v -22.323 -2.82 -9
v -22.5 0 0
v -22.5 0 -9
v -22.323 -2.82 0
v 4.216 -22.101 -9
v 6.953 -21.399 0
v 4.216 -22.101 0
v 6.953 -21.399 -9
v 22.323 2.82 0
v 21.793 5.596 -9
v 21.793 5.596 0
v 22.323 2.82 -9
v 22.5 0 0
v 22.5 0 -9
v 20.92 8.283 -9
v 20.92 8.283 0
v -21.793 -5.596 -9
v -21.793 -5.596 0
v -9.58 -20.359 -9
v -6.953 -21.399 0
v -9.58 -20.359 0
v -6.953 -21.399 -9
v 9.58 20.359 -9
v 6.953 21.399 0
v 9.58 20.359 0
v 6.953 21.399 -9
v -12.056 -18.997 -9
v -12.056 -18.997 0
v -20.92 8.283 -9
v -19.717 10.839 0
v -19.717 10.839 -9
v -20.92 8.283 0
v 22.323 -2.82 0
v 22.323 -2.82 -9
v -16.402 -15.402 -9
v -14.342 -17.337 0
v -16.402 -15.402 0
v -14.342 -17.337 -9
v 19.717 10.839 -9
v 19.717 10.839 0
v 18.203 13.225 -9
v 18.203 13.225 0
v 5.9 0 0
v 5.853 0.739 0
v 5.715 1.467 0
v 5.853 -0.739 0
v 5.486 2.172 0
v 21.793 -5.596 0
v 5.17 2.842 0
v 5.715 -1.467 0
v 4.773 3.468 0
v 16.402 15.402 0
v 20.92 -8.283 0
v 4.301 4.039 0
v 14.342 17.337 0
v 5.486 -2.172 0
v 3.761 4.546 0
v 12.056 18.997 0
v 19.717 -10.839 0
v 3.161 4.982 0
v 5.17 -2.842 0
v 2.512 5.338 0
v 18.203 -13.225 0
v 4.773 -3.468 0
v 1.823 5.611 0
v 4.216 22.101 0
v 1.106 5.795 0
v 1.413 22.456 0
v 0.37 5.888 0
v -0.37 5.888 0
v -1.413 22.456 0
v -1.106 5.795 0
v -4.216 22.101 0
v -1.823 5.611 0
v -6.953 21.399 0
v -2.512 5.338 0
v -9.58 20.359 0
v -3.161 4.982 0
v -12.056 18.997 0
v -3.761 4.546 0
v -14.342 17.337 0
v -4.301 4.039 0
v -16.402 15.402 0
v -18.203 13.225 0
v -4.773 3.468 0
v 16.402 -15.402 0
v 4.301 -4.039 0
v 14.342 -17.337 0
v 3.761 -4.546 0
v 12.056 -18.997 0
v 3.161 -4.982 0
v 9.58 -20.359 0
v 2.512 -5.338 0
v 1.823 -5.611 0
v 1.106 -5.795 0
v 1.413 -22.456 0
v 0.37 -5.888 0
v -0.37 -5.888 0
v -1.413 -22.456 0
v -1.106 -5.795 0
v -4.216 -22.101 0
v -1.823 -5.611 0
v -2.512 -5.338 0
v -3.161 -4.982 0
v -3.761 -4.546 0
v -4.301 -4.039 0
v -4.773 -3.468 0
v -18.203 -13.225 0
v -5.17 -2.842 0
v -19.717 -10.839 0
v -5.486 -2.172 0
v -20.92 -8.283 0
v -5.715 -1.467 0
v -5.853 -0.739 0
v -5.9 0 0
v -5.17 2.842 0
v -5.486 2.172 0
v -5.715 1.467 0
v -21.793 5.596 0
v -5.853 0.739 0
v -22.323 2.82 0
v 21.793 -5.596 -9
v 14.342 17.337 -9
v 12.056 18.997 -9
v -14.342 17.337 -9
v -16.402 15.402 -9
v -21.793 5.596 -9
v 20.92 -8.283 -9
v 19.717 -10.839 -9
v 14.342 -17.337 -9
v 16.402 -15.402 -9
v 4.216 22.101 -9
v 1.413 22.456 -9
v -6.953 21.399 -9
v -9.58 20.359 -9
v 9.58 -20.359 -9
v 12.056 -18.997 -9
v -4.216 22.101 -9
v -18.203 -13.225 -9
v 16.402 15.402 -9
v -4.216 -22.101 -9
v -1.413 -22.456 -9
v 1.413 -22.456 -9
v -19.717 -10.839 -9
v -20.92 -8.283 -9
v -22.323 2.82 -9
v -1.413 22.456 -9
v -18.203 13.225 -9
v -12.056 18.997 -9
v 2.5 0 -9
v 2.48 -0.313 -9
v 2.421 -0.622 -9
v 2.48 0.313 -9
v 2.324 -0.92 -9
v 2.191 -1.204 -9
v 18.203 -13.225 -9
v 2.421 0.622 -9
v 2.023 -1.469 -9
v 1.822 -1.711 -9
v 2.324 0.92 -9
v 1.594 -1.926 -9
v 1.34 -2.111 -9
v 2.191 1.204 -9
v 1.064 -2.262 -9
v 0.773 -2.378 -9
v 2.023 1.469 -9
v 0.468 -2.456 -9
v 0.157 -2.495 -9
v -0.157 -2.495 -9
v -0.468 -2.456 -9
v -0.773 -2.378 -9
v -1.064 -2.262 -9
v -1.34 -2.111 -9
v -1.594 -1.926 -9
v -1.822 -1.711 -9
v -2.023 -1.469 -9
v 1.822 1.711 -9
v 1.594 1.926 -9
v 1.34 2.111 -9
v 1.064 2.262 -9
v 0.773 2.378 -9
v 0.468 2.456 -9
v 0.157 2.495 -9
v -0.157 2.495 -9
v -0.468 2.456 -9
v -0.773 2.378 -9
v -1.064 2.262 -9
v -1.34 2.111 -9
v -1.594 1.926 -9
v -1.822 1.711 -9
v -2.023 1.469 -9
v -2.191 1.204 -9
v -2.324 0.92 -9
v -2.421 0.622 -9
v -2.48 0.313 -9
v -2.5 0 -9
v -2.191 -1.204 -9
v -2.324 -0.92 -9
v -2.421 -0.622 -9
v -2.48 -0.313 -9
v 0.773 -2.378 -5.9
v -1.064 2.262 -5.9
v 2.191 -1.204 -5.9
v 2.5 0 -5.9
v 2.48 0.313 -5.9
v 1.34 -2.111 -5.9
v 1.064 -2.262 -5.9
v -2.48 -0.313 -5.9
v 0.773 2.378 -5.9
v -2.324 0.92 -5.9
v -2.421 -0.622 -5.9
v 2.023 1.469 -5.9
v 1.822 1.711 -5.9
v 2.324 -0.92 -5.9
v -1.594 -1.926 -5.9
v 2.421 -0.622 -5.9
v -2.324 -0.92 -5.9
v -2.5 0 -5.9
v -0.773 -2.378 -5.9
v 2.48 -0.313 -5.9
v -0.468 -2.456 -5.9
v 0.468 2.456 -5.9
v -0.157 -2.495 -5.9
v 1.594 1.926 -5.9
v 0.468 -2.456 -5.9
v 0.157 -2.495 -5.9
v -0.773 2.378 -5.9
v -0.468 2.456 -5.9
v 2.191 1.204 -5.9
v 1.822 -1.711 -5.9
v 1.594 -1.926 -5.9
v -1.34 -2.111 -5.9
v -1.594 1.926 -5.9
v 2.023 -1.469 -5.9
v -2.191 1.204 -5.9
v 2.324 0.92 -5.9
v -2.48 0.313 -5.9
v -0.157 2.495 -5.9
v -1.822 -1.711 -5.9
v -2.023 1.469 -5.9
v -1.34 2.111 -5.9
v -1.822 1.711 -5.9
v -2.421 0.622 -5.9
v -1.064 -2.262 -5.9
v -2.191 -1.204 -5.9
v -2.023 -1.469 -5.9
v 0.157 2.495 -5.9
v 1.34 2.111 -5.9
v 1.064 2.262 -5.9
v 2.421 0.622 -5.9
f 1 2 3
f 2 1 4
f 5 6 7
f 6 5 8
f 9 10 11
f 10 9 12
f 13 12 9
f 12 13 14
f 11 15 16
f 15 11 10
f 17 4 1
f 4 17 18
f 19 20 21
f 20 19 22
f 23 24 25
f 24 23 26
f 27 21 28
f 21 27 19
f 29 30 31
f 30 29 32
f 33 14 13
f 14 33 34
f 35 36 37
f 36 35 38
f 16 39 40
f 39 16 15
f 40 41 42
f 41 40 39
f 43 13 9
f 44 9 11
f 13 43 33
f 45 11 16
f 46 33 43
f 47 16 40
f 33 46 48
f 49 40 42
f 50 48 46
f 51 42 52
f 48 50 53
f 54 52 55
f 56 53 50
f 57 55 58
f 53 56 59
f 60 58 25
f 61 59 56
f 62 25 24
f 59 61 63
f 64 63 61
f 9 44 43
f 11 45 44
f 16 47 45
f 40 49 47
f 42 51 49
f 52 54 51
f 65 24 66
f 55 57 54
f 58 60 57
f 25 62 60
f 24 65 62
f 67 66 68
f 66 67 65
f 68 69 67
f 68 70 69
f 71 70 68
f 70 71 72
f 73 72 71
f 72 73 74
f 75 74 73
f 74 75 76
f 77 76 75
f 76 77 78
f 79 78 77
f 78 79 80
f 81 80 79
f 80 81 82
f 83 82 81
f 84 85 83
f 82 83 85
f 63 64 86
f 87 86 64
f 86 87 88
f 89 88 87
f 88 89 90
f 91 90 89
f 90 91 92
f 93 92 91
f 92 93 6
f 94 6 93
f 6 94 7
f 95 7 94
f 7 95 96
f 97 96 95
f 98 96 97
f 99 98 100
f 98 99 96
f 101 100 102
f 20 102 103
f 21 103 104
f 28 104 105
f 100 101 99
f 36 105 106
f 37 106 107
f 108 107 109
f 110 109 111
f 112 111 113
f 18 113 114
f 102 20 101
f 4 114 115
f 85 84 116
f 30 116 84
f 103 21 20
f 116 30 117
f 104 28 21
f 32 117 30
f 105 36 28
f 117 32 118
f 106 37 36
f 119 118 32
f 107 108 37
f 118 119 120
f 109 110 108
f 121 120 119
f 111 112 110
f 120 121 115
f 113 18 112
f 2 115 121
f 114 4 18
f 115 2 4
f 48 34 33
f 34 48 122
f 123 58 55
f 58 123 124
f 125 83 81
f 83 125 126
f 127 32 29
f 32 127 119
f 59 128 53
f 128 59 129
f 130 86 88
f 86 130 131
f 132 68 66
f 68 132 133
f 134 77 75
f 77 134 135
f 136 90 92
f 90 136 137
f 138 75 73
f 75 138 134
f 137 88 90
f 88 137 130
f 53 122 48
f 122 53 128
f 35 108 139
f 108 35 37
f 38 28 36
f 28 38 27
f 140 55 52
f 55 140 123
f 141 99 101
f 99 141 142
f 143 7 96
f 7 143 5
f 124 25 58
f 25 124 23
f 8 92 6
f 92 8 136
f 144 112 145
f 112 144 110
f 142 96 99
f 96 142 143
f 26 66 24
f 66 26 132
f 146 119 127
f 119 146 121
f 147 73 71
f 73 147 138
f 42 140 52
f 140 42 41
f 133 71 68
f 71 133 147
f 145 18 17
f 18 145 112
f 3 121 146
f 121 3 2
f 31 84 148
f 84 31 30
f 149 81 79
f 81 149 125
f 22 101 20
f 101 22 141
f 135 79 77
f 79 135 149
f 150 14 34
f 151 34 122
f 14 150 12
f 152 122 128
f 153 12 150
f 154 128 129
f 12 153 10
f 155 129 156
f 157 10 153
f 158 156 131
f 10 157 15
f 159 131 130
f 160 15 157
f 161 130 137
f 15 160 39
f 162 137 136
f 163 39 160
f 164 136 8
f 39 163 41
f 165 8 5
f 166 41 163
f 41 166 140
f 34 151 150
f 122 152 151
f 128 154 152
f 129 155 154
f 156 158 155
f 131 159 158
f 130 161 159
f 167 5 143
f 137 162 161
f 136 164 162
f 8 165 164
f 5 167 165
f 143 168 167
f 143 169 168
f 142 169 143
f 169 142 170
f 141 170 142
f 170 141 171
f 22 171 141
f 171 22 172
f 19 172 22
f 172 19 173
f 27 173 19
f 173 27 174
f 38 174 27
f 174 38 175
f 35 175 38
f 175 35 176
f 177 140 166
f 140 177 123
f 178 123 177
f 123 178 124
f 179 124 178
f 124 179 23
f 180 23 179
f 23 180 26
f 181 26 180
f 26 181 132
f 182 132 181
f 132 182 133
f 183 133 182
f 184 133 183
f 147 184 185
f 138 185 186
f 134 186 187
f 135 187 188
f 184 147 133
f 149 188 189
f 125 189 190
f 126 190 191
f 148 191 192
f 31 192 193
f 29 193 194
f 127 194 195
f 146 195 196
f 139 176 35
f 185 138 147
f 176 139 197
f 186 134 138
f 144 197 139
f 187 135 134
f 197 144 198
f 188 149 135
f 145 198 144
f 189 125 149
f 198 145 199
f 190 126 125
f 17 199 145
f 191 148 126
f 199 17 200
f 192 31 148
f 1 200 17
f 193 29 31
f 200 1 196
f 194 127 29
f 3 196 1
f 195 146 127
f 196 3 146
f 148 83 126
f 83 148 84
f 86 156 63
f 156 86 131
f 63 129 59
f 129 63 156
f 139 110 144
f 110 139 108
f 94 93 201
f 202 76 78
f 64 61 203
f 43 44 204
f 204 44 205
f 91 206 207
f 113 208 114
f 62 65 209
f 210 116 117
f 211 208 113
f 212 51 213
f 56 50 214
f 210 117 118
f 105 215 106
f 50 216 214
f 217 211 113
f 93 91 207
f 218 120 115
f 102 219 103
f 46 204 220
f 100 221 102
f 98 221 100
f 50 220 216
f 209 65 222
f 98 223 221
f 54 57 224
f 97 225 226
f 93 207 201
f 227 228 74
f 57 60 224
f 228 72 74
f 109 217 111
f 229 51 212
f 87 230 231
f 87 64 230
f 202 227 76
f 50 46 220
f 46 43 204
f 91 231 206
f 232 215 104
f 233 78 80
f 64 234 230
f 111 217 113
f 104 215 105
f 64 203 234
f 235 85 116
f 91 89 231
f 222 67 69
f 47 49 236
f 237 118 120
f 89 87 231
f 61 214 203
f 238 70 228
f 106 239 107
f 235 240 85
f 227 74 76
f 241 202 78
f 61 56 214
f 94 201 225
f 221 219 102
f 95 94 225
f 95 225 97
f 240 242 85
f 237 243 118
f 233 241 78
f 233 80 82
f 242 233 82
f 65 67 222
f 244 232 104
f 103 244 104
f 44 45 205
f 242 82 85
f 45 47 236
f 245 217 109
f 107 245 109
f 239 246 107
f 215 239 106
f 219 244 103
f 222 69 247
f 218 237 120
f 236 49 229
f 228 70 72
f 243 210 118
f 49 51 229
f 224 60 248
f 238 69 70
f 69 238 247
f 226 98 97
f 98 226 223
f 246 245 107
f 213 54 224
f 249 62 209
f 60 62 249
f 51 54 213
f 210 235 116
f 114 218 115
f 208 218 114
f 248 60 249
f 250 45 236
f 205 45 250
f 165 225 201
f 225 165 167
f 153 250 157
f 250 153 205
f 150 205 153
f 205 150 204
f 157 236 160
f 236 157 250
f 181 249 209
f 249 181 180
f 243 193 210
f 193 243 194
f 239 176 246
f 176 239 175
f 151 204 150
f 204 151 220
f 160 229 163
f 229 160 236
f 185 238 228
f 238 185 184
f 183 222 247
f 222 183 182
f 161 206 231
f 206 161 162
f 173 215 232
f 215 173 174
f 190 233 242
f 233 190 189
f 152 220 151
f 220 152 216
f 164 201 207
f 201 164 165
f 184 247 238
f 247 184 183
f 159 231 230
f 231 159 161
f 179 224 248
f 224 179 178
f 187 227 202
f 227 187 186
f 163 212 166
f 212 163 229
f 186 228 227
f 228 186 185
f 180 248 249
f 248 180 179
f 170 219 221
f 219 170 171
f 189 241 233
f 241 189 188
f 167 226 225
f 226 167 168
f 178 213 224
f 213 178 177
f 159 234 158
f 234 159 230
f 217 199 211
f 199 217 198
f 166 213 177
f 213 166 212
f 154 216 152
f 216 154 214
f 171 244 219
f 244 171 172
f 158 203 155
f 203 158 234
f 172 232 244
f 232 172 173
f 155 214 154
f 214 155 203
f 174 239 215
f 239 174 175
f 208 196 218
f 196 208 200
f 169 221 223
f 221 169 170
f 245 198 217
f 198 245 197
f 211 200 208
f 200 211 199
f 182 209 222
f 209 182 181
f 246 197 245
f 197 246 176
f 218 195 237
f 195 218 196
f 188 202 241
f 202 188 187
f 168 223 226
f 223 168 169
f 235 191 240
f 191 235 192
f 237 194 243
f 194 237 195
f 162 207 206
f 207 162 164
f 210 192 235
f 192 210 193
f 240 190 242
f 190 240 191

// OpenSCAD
$fn = 50;


difference() {
	union() {
		translate(v = [0, 0, -9.0000000000]) {
			cylinder(h = 9, r = 22.5000000000);
		}
		translate(v = [0, 0, -9.0000000000]) {
			cylinder(h = 9, r = 2.8750000000);
		}
	}
	union() {
		translate(v = [0, 0, 0]) {
			rotate(a = [0, 0, 0]) {
				difference() {
					union() {
						#translate(v = [0, 0, -9.0000000000]) {
							cylinder(h = 9, r = 2.2500000000);
						}
						#translate(v = [0, 0, -5.9000000000]) {
							cylinder(h = 5.9000000000, r1 = 2.5000000000, r2 = 5.9000000000);
						}
						#translate(v = [0, 0, -9.0000000000]) {
							cylinder(h = 9, r = 2.5000000000);
						}
						#translate(v = [0, 0, -9.0000000000]) {
							cylinder(h = 9, r = 2.2500000000);
						}
					}
					union();
				}
			}
		}
	}
}
